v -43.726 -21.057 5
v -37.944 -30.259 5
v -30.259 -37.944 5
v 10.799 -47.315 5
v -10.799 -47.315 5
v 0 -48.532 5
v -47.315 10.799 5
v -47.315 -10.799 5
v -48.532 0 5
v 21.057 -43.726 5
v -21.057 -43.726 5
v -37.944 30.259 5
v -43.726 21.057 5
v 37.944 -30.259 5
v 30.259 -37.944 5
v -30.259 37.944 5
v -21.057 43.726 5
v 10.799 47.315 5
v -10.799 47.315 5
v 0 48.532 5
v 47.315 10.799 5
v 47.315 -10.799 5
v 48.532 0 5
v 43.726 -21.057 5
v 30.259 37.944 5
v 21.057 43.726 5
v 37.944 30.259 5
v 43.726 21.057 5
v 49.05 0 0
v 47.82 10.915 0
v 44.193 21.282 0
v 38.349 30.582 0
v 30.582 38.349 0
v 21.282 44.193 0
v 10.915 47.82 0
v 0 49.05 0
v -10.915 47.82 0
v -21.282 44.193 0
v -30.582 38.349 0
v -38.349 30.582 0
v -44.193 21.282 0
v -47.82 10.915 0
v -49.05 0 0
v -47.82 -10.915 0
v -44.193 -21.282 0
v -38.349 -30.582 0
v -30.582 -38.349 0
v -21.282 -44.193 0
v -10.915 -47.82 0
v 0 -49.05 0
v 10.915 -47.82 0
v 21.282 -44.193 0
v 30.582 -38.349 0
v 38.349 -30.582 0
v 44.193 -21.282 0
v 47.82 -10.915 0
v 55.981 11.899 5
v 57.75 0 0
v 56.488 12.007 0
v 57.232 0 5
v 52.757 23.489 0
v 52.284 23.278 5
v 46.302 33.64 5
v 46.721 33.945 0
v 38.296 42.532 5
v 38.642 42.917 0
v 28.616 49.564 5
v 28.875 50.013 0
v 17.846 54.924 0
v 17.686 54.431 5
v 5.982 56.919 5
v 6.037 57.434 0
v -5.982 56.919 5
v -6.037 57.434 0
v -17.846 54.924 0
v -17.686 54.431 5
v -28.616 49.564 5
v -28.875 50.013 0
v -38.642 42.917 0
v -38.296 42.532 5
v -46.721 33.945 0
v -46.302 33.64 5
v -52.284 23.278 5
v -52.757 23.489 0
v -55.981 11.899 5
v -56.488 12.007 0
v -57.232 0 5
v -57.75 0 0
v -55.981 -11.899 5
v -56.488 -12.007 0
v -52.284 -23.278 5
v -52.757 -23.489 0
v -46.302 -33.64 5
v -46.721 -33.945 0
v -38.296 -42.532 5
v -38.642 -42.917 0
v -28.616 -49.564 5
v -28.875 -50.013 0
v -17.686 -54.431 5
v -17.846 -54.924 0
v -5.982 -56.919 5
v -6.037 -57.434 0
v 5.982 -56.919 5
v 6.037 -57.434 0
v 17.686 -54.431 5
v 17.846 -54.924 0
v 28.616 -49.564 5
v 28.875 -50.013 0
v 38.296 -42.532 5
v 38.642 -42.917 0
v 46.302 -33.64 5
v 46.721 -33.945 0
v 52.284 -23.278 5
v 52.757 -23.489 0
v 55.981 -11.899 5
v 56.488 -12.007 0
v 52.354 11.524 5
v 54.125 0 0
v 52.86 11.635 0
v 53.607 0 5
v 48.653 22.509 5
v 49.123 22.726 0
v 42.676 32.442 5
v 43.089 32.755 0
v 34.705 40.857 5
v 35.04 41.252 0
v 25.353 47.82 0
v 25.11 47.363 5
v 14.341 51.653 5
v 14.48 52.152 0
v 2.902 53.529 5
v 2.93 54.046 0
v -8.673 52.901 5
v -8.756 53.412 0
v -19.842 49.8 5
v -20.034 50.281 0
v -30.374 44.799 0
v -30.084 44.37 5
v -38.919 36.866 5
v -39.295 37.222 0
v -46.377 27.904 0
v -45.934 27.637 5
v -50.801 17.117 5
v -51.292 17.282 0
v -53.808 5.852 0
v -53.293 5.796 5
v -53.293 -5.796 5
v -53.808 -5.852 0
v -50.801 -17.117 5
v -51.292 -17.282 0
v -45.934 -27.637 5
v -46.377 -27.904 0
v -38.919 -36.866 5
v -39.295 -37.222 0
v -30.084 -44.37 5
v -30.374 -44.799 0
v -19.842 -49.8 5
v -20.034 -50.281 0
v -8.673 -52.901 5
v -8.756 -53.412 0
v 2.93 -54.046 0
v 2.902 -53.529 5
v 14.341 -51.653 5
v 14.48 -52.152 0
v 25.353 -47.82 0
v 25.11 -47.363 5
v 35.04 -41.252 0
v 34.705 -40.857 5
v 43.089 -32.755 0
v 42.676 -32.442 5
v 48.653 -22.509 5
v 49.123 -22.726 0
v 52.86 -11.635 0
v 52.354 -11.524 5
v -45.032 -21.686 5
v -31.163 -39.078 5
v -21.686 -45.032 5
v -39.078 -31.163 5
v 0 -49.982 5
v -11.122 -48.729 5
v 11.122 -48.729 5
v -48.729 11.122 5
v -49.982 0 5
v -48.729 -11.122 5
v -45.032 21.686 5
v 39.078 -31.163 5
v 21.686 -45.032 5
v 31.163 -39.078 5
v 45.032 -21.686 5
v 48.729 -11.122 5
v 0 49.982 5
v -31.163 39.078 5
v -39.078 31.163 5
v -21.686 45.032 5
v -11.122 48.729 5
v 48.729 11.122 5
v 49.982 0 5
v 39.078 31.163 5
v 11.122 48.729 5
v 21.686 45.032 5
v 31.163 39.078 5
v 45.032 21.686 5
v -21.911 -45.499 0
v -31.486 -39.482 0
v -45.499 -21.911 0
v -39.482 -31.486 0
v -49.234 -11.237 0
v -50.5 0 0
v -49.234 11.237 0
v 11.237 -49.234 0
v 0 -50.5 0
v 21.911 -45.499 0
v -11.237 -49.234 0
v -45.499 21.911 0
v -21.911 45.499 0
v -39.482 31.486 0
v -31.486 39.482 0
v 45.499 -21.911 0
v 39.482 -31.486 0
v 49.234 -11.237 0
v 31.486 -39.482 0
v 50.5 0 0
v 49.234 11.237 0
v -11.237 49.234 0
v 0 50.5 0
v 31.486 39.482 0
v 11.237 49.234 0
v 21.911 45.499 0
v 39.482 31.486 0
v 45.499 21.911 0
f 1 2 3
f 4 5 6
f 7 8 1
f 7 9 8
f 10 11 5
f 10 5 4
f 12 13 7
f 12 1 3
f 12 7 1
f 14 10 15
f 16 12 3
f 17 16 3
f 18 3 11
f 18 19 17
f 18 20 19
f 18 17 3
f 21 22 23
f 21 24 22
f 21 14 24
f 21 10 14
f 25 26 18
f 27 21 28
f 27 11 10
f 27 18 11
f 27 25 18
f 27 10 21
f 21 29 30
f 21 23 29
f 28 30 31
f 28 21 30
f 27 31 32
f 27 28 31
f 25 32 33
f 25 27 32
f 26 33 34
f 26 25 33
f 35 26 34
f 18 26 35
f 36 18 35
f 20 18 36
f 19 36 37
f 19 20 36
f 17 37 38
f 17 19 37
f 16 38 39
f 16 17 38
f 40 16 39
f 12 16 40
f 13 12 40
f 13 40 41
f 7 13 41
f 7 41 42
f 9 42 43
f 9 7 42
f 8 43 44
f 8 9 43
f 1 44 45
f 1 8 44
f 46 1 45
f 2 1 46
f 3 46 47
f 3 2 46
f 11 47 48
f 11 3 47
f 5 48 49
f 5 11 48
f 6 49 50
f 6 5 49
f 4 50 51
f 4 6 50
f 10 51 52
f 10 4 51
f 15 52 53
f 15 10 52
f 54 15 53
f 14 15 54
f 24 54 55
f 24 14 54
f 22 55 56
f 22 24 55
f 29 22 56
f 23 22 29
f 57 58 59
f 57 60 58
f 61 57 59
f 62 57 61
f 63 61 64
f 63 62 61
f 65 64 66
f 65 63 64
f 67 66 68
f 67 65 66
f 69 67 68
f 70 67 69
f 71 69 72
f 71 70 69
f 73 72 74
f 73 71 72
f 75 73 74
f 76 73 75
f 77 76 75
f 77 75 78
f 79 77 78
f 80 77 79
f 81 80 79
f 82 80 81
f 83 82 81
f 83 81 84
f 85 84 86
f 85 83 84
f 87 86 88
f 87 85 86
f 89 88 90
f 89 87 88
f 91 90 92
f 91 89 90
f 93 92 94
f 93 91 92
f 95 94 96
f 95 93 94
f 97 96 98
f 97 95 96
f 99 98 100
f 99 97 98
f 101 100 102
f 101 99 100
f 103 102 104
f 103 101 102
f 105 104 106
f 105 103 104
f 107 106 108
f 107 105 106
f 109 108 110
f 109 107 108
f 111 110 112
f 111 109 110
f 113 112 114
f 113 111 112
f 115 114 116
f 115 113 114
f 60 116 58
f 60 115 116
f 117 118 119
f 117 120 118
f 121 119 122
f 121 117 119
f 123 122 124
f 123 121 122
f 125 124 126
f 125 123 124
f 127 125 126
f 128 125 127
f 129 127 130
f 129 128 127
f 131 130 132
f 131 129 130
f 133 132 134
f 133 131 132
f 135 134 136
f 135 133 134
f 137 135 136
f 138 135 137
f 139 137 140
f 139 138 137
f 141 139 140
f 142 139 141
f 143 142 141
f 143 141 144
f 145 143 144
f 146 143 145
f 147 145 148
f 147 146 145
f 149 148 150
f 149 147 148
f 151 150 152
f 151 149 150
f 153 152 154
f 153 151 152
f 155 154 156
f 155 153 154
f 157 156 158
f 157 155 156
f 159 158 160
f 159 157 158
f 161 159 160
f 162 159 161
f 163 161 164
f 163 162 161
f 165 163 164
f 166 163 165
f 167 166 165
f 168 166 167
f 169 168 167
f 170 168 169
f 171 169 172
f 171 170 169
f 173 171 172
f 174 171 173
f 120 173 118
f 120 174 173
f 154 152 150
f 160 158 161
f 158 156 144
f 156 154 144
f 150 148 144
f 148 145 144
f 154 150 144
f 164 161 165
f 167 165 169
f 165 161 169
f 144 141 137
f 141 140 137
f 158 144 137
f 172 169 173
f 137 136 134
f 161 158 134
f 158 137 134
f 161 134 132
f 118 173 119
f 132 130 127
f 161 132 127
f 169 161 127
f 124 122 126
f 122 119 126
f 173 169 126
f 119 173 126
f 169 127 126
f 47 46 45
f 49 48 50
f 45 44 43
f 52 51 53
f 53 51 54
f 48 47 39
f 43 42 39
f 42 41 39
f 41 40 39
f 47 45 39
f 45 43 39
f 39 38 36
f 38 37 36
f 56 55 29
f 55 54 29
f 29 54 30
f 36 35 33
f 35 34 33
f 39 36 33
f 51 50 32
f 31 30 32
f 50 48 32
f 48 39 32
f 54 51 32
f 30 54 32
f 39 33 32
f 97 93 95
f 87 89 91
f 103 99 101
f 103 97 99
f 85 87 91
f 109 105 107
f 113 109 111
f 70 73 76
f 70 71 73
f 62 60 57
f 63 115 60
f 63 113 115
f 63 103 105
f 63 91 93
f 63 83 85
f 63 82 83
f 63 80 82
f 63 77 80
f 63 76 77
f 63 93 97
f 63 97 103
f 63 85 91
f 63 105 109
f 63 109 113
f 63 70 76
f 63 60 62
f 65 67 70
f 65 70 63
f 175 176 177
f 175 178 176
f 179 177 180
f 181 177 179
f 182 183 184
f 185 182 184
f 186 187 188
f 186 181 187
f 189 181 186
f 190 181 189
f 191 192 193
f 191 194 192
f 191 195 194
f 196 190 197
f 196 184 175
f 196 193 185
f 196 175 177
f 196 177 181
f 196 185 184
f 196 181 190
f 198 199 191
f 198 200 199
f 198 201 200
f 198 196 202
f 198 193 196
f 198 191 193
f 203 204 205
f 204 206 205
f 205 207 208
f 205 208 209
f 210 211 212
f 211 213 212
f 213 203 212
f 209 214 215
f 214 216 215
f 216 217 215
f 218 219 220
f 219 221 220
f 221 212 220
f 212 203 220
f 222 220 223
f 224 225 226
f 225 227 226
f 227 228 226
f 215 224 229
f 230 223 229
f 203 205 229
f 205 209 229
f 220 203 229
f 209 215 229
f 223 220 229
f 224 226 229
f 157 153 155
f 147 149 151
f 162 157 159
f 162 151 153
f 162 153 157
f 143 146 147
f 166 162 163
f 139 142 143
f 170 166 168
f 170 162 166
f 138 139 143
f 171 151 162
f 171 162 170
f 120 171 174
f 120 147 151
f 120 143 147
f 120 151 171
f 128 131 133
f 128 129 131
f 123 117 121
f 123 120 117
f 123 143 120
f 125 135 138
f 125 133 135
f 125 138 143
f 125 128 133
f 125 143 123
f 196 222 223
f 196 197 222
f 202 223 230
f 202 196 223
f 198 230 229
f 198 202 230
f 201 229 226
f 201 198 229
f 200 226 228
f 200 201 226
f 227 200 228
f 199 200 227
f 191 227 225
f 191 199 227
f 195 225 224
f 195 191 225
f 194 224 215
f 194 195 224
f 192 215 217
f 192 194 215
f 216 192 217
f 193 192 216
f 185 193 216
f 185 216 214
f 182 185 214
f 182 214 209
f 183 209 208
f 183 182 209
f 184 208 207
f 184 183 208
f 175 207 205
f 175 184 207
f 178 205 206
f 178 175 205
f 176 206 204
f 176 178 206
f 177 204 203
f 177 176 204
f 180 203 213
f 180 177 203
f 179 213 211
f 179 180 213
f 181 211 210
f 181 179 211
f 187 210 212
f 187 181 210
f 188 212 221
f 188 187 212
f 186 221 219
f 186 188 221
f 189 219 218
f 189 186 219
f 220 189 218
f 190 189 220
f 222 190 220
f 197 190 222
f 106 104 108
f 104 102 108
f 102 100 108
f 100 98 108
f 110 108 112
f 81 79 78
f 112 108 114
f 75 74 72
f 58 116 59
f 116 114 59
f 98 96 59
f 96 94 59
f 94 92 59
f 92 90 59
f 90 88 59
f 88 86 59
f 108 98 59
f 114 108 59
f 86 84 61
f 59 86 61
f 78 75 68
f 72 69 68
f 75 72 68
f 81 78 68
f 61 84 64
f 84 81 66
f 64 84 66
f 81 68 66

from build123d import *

# Parameters (mm, degrees)
F6_R      = 57.75
F7_DEPTH  = 5
F7_TAPER  = 5.9131224442
F8_R      = 54.125
F9_DEPTH  = 5
F9_TAPER  = 5.9131224442
F10_R     = 50.5
F11_DEPTH = 5
F11_TAPER = 5.9131224442
F12_R     = 49.05
F13_DEPTH = 5
F13_TAPER = 5.9131224442


with BuildPart() as f7:
    # F6 (on Top) → F7 (new body)
    with BuildSketch(Plane.XY):
        Circle(F6_R)
    extrude(amount=F7_DEPTH, taper=F7_TAPER)


with BuildPart() as f9:
    # F8 (on Top) → F9 (new body)
    with BuildSketch(Plane.XY):
        Circle(F8_R)
    extrude(amount=F9_DEPTH, taper=F9_TAPER)


with BuildPart() as f11:
    # F10 (on Top) → F11 (new body)
    with BuildSketch(Plane.XY):
        Circle(F10_R)
    extrude(amount=F11_DEPTH, taper=F11_TAPER)


with BuildPart() as f13:
    # F12 (on Top) → F13 (new body)
    with BuildSketch(Plane.XY):
        Circle(F12_R)
    extrude(amount=F13_DEPTH, taper=F13_TAPER)


solid = Compound([f7.part, f9.part, f11.part, f13.part])
